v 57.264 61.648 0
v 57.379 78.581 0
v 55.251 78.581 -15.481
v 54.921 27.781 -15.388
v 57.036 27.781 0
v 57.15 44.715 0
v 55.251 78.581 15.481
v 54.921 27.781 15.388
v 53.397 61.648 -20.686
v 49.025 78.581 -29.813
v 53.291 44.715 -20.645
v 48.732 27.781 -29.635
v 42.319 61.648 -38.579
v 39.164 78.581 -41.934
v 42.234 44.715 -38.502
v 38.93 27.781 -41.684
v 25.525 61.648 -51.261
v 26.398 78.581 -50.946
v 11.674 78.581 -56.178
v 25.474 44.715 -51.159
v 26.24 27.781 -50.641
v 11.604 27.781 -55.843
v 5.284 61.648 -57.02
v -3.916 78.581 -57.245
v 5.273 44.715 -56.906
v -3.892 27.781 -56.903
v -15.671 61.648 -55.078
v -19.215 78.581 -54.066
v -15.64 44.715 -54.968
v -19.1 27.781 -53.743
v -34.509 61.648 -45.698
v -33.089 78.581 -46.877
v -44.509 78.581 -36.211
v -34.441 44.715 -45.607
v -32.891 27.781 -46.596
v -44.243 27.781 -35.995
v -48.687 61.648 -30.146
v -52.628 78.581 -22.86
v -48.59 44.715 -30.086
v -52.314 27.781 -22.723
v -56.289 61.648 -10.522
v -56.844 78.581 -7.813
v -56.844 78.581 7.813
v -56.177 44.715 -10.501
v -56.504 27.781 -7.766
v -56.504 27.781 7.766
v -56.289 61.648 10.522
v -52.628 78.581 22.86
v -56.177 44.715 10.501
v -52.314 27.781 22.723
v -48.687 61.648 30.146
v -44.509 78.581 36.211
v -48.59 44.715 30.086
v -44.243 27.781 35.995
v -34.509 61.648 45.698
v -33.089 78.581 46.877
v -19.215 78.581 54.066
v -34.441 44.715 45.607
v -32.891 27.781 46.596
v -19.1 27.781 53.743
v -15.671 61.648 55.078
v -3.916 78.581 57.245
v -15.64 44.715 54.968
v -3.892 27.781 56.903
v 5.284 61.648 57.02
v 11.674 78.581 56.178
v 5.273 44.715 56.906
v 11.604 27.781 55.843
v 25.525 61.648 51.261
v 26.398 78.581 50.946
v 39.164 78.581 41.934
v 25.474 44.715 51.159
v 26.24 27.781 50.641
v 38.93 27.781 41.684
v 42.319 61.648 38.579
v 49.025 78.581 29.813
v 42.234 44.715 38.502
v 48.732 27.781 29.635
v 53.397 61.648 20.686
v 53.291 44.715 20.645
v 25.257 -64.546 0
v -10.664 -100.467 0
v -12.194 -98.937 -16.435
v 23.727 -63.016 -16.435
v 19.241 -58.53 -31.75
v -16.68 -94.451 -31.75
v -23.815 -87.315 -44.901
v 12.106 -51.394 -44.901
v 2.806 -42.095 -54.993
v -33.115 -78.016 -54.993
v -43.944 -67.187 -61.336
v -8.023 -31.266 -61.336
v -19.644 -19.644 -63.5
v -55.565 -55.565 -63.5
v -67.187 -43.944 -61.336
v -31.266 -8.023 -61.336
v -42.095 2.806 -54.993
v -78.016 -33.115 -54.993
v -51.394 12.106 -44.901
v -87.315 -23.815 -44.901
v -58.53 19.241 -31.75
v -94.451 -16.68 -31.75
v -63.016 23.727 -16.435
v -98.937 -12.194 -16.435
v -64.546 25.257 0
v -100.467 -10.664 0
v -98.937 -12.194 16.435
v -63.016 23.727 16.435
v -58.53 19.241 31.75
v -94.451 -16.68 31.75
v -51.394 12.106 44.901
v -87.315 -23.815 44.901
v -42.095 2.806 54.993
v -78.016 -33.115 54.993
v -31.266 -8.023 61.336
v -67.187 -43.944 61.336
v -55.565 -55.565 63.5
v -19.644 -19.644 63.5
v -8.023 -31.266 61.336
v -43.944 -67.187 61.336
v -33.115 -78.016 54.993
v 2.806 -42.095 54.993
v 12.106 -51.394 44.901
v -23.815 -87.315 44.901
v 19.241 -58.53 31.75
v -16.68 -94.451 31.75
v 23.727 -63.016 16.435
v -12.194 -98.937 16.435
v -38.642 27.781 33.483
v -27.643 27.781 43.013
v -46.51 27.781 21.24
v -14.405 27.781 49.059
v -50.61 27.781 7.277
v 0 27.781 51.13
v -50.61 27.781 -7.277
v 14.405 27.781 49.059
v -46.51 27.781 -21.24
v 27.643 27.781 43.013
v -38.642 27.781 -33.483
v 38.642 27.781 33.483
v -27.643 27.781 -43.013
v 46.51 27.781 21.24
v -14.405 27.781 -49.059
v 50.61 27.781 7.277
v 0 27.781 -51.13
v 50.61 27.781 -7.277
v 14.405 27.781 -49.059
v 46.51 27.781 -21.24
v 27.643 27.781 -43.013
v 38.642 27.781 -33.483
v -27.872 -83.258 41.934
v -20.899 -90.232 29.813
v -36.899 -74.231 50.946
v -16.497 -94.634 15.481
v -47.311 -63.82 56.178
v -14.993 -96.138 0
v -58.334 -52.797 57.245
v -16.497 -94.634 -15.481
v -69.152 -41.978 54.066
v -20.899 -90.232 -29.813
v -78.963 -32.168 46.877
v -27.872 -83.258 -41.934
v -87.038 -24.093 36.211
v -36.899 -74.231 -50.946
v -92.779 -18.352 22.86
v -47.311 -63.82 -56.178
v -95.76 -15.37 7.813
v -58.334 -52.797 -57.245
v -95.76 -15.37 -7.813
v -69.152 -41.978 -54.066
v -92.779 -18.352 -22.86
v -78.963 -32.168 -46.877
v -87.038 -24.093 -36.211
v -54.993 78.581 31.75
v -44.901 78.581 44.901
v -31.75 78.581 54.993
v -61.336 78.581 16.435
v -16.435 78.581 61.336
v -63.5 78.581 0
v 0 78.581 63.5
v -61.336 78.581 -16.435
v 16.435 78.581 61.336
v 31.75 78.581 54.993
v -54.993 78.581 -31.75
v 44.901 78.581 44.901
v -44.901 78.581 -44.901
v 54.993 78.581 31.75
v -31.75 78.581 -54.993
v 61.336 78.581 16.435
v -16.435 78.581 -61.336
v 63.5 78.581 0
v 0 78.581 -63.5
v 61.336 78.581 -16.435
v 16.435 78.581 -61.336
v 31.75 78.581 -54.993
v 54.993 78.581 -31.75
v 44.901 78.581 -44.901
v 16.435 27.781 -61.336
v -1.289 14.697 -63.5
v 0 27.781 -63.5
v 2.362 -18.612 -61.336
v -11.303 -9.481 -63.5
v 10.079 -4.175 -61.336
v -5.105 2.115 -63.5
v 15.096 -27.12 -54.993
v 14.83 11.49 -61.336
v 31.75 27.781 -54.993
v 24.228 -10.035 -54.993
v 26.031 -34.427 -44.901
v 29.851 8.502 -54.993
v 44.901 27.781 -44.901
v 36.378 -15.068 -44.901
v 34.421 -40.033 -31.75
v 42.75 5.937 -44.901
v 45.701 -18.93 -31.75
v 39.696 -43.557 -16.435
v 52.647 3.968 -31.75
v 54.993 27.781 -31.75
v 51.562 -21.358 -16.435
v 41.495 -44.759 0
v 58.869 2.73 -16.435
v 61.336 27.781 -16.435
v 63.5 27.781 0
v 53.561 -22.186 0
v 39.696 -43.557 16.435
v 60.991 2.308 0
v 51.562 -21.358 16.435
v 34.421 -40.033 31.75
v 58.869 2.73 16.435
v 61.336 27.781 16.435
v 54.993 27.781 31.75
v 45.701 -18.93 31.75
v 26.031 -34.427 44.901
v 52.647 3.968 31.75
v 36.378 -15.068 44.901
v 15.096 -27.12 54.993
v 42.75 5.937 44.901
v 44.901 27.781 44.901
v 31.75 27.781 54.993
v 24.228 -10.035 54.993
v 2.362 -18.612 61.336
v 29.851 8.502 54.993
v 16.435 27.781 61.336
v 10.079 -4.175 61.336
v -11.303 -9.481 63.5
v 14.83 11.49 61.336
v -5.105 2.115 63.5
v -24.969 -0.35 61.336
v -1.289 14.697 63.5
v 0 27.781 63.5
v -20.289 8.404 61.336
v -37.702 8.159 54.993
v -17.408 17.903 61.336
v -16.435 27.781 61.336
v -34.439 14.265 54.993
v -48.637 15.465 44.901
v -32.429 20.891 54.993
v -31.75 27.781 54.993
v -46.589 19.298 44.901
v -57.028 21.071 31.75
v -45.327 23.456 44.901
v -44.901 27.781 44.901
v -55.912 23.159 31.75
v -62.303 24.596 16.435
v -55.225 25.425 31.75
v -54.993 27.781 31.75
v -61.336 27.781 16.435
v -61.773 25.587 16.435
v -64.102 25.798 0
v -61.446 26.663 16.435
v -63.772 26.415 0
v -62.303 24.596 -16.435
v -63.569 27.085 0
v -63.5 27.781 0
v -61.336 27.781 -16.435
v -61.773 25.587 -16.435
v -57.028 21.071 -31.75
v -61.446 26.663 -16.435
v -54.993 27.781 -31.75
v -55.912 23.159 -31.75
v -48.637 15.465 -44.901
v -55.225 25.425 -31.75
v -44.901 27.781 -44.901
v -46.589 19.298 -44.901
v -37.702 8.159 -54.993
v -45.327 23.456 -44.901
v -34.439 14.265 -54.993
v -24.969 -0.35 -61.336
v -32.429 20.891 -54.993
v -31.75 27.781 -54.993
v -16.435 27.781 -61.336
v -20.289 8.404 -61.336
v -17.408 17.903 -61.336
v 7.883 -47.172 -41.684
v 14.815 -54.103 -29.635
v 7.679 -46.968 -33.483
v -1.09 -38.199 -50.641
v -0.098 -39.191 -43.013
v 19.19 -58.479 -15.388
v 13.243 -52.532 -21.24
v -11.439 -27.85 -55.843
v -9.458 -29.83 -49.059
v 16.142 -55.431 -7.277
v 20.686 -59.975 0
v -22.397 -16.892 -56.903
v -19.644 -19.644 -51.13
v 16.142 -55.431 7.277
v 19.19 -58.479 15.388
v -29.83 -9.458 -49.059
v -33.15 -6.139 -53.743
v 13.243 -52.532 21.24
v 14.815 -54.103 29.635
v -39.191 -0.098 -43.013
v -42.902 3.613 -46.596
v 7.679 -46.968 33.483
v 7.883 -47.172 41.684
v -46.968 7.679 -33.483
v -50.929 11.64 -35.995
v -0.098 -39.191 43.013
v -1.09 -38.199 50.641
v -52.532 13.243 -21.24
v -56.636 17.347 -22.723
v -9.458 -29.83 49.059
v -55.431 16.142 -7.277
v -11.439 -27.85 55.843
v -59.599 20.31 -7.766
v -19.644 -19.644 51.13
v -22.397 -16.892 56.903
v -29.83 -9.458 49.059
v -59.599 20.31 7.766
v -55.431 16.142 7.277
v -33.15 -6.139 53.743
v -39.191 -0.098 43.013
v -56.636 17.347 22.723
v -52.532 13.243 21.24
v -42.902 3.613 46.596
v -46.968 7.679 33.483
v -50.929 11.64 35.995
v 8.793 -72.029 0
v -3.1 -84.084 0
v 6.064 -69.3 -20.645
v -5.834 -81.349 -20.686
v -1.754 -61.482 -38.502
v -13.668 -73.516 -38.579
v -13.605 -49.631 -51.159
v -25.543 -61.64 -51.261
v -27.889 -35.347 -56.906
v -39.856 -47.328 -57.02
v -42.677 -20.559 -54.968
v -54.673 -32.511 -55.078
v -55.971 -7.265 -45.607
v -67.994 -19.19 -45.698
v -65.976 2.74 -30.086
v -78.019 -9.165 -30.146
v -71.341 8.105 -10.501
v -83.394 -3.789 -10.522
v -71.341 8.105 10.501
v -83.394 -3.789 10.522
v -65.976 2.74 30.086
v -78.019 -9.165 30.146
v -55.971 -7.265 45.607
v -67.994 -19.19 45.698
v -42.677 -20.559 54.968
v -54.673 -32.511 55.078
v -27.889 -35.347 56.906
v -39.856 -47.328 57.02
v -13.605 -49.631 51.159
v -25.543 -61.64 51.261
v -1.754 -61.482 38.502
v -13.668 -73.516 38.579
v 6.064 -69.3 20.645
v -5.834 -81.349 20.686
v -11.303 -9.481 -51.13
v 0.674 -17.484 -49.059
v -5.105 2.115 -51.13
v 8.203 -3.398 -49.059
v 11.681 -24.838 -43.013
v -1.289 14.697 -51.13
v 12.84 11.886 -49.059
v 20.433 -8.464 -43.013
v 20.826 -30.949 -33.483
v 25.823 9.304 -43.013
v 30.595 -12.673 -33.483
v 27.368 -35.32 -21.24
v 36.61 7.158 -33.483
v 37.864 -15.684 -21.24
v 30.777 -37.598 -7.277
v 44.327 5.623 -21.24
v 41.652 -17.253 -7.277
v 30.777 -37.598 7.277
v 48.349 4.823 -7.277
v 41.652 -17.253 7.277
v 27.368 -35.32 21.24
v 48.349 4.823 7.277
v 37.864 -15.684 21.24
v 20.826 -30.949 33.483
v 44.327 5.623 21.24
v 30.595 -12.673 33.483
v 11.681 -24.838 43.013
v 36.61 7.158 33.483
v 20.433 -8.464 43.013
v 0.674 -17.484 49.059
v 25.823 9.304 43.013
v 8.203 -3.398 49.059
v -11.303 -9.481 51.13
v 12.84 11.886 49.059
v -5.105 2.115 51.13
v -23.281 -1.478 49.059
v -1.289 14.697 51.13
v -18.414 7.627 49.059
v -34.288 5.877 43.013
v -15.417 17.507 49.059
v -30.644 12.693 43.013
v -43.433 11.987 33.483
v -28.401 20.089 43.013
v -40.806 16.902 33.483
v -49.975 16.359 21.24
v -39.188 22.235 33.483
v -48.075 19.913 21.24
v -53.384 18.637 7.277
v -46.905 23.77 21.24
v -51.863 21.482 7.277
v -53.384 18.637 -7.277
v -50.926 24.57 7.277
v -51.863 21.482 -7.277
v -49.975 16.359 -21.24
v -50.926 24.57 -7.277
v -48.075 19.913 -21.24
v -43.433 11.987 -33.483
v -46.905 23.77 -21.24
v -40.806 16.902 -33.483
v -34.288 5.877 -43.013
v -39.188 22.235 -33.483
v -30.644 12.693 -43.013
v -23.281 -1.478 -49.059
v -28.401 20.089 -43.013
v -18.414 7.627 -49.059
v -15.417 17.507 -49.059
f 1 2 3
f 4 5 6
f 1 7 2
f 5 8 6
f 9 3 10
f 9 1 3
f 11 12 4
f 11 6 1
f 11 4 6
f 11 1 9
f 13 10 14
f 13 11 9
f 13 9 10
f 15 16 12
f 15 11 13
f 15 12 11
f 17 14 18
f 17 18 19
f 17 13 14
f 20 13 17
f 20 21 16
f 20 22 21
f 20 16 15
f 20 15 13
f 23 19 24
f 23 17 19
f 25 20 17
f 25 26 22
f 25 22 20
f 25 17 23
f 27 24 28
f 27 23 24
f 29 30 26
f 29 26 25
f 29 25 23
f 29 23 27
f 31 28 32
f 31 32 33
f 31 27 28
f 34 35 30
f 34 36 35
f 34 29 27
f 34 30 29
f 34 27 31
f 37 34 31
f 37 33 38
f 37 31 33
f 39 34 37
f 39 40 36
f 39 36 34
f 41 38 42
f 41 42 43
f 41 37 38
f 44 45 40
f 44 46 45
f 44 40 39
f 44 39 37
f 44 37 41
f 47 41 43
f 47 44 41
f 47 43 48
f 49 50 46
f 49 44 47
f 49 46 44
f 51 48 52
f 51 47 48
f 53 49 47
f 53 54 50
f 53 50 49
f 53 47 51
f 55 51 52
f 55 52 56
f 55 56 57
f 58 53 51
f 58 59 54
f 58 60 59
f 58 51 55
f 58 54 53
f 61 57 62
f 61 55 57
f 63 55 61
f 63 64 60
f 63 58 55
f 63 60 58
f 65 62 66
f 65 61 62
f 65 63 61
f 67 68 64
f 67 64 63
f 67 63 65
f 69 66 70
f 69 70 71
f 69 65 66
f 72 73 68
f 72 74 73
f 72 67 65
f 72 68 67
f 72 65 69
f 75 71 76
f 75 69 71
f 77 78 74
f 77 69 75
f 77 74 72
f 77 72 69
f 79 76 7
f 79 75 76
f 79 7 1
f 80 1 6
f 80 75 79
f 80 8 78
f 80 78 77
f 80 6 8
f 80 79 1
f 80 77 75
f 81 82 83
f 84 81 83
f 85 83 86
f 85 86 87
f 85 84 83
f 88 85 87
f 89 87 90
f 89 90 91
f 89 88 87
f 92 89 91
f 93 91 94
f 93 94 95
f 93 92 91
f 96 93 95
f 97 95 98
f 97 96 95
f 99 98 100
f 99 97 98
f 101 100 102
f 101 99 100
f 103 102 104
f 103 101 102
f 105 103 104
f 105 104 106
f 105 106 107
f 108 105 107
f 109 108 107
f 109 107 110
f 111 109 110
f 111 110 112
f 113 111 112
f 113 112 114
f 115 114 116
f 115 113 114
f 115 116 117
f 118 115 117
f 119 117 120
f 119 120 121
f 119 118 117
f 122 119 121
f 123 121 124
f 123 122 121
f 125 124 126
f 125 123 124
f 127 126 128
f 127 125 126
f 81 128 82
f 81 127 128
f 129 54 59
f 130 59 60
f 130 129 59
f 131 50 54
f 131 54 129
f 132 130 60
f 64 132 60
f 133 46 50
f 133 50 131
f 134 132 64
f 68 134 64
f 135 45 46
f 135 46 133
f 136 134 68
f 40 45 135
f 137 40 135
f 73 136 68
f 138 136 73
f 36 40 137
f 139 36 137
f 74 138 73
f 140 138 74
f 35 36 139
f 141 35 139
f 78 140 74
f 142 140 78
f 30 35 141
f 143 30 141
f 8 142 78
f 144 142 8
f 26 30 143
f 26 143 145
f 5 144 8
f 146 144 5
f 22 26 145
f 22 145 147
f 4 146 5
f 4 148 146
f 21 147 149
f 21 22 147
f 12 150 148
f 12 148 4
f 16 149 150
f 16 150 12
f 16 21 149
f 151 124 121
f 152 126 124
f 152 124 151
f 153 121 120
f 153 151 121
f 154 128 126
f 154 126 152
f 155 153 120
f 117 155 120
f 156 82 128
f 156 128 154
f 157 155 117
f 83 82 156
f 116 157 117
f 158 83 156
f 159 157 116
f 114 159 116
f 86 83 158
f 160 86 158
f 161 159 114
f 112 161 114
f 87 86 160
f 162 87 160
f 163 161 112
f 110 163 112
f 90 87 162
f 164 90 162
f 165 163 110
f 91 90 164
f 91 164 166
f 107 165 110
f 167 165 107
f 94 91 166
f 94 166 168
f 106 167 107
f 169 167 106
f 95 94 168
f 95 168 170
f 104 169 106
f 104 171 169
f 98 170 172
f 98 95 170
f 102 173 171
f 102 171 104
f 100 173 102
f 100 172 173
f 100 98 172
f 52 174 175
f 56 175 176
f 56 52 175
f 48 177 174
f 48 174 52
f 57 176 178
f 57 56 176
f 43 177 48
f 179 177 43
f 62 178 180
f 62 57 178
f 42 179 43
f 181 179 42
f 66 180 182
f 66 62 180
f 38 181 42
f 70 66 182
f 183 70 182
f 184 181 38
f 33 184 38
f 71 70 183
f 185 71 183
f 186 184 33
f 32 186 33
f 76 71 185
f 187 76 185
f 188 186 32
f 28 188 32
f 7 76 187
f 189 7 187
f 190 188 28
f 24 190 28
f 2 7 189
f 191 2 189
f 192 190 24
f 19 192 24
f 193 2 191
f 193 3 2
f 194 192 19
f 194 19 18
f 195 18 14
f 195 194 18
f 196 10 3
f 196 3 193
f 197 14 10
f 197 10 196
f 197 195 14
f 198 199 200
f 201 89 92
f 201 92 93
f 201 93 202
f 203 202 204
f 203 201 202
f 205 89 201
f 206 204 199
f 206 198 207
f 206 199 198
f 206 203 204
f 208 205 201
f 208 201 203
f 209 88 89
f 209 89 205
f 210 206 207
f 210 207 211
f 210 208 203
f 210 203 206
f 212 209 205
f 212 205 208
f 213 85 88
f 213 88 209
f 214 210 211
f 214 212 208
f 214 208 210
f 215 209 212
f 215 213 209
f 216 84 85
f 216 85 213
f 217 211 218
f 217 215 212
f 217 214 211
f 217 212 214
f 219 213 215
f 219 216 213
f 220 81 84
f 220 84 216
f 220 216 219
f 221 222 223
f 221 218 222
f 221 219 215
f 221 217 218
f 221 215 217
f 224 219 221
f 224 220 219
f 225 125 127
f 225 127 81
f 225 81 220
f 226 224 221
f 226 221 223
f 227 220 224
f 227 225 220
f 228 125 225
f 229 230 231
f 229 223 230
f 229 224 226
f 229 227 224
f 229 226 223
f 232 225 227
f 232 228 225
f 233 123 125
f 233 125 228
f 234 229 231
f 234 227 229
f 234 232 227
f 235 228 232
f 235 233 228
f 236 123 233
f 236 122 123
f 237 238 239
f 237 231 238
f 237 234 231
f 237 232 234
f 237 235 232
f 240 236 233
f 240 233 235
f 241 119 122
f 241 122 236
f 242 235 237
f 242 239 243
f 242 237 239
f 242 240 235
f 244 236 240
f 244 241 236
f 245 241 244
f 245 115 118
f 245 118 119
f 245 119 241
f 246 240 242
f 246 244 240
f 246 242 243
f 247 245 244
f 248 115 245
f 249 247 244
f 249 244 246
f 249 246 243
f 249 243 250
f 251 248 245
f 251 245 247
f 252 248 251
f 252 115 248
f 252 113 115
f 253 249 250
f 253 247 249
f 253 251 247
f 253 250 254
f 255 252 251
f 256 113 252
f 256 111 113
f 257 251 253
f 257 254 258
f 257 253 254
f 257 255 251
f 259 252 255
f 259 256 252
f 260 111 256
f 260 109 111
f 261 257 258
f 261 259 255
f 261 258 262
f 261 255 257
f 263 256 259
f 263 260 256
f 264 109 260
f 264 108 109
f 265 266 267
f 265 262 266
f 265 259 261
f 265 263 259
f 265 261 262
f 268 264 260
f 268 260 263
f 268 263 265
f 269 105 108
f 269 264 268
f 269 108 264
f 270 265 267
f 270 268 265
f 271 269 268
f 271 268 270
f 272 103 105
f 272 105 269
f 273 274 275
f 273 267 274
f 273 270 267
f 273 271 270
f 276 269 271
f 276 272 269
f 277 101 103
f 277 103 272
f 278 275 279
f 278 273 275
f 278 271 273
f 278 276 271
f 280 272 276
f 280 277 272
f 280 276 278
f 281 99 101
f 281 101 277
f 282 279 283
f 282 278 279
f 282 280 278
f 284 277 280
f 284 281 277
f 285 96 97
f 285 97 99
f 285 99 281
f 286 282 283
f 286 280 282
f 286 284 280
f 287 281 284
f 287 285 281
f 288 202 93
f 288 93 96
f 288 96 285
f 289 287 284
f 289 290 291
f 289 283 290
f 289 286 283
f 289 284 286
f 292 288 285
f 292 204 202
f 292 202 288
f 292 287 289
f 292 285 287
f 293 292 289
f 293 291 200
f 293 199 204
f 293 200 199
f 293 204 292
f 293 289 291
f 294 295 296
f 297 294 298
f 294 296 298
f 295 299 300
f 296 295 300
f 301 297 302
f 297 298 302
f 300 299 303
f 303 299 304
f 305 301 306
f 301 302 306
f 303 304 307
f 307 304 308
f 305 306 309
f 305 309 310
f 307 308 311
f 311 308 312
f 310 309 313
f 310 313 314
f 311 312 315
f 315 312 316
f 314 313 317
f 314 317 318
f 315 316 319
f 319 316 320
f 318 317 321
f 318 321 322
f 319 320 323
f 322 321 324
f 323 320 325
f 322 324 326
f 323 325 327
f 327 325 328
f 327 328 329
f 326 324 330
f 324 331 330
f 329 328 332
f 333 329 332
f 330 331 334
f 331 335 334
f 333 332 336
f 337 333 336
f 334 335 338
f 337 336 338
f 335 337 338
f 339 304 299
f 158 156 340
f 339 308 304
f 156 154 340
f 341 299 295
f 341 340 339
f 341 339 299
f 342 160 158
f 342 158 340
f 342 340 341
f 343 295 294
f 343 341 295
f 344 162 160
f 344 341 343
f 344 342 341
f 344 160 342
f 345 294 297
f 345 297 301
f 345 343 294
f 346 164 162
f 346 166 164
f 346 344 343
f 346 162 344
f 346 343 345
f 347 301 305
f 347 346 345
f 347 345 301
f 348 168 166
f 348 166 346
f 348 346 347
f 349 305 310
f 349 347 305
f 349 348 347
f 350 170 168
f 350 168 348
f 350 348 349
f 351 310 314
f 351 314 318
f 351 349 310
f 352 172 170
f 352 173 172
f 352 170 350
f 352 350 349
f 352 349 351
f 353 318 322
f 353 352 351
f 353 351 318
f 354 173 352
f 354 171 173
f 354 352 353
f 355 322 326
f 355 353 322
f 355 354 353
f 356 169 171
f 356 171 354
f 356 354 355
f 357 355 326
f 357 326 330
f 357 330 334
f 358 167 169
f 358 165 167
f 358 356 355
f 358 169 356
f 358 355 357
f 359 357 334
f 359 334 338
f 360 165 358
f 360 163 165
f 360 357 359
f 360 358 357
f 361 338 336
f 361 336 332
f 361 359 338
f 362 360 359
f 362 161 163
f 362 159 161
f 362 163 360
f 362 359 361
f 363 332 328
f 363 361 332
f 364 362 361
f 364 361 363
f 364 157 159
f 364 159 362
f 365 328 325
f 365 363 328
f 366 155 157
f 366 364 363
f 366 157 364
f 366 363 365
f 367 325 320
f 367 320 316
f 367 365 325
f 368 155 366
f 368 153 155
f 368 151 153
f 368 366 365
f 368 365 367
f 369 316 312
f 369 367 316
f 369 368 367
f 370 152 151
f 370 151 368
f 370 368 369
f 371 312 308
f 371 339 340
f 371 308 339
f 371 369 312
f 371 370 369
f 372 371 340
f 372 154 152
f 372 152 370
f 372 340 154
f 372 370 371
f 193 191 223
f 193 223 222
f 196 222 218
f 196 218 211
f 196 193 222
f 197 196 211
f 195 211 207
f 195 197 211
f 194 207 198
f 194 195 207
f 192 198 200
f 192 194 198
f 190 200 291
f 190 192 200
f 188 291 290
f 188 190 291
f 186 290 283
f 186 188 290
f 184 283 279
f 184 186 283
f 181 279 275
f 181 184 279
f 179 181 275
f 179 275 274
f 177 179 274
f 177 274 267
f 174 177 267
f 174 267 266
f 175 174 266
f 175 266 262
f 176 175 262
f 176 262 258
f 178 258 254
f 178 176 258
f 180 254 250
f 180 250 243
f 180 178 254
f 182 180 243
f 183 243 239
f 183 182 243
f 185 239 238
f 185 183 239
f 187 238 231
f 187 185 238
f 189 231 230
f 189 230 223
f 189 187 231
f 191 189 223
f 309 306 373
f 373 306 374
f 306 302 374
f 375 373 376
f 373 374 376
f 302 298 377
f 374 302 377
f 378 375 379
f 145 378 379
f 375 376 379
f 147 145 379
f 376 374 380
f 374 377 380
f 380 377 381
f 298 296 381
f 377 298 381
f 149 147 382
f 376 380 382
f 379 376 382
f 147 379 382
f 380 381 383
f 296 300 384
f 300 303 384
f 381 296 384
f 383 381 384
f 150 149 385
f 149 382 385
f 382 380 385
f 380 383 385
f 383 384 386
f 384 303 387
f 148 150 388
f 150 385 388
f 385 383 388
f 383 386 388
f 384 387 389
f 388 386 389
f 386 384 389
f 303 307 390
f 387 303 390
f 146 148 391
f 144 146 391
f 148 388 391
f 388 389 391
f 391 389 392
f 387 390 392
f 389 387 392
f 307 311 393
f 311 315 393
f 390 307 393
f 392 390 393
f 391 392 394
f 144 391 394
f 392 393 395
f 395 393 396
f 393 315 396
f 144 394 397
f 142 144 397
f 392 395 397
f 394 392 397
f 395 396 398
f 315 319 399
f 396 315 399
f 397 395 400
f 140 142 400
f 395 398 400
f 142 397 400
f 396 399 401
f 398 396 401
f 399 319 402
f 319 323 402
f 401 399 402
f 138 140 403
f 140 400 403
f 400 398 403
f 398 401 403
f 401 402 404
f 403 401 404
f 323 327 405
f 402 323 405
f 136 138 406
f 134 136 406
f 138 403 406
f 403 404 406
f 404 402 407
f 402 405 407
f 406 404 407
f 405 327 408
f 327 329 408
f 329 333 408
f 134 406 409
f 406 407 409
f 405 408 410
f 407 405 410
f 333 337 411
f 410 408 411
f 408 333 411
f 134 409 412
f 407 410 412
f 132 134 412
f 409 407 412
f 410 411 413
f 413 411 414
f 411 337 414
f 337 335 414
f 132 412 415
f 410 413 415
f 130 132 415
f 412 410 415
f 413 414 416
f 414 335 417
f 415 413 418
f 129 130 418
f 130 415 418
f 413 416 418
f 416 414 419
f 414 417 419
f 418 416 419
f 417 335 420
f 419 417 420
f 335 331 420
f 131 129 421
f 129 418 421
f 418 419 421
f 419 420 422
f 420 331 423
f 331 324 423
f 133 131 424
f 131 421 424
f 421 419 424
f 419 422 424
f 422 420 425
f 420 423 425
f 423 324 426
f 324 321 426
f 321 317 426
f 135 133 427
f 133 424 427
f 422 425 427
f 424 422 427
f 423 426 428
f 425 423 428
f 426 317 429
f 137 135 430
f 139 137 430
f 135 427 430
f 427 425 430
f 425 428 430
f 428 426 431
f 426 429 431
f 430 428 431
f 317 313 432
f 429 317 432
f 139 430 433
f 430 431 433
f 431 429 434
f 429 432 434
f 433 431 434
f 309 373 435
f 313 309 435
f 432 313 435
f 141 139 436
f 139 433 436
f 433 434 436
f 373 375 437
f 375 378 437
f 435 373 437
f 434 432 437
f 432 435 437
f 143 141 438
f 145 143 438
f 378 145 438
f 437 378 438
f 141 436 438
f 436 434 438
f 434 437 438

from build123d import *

# Parameters (mm, degrees)
SKETCH3_R   = 63.5
SKETCH3_R_2 = 51.1302


with BuildPart() as part:
    # Sketch1 → Revolve1 (revolve)
    with BuildSketch(Plane.XY):
        Polygon((-10.664054144, -100.466615354), (25.256970341, -64.54559087), (20.686019975, -59.974640505), (-14.992537594, -96.138131904), align=None)
    revolve(axis=Axis((-55.565334749, -55.565334749, 0), (0.7071067811865487, 0.7071067811865465, 0)))



with BuildPart() as body_2:
    # Sketch2 → Revolve2 (revolve)
    with BuildSketch(Plane.XY):
        Polygon((57.3786, 78.58125), (57.0357, 27.78125), (63.5, 27.78125), (63.5, 78.58125), align=None)
    revolve(axis=Axis((0, 0, 0), (0, 1, 0)))


with BuildPart() as part_1:
    add(part.part)

    add(body_2.part)  # Sweep1 merges body 2
    # Sweep1: sweep along a path in Sketch4
    with BuildLine(Plane.XY) as sweep1_path:
        ThreePointArc((-19.644310265, -19.644310265), (-5.105389899, 2.114721737), (0, 27.78125))
    # Sketch3 → Sweep1 (sweep)
    with BuildSketch(Plane(origin=(-19.644310265, -19.644310265, 0), x_dir=(0, 0, -1), z_dir=(0.7071067811865488, 0.7071067811865464, 0))):
        Circle(SKETCH3_R)
        Circle(SKETCH3_R_2, mode=Mode.SUBTRACT)
    sweep(path=sweep1_path.line)


solid = part_1.part
